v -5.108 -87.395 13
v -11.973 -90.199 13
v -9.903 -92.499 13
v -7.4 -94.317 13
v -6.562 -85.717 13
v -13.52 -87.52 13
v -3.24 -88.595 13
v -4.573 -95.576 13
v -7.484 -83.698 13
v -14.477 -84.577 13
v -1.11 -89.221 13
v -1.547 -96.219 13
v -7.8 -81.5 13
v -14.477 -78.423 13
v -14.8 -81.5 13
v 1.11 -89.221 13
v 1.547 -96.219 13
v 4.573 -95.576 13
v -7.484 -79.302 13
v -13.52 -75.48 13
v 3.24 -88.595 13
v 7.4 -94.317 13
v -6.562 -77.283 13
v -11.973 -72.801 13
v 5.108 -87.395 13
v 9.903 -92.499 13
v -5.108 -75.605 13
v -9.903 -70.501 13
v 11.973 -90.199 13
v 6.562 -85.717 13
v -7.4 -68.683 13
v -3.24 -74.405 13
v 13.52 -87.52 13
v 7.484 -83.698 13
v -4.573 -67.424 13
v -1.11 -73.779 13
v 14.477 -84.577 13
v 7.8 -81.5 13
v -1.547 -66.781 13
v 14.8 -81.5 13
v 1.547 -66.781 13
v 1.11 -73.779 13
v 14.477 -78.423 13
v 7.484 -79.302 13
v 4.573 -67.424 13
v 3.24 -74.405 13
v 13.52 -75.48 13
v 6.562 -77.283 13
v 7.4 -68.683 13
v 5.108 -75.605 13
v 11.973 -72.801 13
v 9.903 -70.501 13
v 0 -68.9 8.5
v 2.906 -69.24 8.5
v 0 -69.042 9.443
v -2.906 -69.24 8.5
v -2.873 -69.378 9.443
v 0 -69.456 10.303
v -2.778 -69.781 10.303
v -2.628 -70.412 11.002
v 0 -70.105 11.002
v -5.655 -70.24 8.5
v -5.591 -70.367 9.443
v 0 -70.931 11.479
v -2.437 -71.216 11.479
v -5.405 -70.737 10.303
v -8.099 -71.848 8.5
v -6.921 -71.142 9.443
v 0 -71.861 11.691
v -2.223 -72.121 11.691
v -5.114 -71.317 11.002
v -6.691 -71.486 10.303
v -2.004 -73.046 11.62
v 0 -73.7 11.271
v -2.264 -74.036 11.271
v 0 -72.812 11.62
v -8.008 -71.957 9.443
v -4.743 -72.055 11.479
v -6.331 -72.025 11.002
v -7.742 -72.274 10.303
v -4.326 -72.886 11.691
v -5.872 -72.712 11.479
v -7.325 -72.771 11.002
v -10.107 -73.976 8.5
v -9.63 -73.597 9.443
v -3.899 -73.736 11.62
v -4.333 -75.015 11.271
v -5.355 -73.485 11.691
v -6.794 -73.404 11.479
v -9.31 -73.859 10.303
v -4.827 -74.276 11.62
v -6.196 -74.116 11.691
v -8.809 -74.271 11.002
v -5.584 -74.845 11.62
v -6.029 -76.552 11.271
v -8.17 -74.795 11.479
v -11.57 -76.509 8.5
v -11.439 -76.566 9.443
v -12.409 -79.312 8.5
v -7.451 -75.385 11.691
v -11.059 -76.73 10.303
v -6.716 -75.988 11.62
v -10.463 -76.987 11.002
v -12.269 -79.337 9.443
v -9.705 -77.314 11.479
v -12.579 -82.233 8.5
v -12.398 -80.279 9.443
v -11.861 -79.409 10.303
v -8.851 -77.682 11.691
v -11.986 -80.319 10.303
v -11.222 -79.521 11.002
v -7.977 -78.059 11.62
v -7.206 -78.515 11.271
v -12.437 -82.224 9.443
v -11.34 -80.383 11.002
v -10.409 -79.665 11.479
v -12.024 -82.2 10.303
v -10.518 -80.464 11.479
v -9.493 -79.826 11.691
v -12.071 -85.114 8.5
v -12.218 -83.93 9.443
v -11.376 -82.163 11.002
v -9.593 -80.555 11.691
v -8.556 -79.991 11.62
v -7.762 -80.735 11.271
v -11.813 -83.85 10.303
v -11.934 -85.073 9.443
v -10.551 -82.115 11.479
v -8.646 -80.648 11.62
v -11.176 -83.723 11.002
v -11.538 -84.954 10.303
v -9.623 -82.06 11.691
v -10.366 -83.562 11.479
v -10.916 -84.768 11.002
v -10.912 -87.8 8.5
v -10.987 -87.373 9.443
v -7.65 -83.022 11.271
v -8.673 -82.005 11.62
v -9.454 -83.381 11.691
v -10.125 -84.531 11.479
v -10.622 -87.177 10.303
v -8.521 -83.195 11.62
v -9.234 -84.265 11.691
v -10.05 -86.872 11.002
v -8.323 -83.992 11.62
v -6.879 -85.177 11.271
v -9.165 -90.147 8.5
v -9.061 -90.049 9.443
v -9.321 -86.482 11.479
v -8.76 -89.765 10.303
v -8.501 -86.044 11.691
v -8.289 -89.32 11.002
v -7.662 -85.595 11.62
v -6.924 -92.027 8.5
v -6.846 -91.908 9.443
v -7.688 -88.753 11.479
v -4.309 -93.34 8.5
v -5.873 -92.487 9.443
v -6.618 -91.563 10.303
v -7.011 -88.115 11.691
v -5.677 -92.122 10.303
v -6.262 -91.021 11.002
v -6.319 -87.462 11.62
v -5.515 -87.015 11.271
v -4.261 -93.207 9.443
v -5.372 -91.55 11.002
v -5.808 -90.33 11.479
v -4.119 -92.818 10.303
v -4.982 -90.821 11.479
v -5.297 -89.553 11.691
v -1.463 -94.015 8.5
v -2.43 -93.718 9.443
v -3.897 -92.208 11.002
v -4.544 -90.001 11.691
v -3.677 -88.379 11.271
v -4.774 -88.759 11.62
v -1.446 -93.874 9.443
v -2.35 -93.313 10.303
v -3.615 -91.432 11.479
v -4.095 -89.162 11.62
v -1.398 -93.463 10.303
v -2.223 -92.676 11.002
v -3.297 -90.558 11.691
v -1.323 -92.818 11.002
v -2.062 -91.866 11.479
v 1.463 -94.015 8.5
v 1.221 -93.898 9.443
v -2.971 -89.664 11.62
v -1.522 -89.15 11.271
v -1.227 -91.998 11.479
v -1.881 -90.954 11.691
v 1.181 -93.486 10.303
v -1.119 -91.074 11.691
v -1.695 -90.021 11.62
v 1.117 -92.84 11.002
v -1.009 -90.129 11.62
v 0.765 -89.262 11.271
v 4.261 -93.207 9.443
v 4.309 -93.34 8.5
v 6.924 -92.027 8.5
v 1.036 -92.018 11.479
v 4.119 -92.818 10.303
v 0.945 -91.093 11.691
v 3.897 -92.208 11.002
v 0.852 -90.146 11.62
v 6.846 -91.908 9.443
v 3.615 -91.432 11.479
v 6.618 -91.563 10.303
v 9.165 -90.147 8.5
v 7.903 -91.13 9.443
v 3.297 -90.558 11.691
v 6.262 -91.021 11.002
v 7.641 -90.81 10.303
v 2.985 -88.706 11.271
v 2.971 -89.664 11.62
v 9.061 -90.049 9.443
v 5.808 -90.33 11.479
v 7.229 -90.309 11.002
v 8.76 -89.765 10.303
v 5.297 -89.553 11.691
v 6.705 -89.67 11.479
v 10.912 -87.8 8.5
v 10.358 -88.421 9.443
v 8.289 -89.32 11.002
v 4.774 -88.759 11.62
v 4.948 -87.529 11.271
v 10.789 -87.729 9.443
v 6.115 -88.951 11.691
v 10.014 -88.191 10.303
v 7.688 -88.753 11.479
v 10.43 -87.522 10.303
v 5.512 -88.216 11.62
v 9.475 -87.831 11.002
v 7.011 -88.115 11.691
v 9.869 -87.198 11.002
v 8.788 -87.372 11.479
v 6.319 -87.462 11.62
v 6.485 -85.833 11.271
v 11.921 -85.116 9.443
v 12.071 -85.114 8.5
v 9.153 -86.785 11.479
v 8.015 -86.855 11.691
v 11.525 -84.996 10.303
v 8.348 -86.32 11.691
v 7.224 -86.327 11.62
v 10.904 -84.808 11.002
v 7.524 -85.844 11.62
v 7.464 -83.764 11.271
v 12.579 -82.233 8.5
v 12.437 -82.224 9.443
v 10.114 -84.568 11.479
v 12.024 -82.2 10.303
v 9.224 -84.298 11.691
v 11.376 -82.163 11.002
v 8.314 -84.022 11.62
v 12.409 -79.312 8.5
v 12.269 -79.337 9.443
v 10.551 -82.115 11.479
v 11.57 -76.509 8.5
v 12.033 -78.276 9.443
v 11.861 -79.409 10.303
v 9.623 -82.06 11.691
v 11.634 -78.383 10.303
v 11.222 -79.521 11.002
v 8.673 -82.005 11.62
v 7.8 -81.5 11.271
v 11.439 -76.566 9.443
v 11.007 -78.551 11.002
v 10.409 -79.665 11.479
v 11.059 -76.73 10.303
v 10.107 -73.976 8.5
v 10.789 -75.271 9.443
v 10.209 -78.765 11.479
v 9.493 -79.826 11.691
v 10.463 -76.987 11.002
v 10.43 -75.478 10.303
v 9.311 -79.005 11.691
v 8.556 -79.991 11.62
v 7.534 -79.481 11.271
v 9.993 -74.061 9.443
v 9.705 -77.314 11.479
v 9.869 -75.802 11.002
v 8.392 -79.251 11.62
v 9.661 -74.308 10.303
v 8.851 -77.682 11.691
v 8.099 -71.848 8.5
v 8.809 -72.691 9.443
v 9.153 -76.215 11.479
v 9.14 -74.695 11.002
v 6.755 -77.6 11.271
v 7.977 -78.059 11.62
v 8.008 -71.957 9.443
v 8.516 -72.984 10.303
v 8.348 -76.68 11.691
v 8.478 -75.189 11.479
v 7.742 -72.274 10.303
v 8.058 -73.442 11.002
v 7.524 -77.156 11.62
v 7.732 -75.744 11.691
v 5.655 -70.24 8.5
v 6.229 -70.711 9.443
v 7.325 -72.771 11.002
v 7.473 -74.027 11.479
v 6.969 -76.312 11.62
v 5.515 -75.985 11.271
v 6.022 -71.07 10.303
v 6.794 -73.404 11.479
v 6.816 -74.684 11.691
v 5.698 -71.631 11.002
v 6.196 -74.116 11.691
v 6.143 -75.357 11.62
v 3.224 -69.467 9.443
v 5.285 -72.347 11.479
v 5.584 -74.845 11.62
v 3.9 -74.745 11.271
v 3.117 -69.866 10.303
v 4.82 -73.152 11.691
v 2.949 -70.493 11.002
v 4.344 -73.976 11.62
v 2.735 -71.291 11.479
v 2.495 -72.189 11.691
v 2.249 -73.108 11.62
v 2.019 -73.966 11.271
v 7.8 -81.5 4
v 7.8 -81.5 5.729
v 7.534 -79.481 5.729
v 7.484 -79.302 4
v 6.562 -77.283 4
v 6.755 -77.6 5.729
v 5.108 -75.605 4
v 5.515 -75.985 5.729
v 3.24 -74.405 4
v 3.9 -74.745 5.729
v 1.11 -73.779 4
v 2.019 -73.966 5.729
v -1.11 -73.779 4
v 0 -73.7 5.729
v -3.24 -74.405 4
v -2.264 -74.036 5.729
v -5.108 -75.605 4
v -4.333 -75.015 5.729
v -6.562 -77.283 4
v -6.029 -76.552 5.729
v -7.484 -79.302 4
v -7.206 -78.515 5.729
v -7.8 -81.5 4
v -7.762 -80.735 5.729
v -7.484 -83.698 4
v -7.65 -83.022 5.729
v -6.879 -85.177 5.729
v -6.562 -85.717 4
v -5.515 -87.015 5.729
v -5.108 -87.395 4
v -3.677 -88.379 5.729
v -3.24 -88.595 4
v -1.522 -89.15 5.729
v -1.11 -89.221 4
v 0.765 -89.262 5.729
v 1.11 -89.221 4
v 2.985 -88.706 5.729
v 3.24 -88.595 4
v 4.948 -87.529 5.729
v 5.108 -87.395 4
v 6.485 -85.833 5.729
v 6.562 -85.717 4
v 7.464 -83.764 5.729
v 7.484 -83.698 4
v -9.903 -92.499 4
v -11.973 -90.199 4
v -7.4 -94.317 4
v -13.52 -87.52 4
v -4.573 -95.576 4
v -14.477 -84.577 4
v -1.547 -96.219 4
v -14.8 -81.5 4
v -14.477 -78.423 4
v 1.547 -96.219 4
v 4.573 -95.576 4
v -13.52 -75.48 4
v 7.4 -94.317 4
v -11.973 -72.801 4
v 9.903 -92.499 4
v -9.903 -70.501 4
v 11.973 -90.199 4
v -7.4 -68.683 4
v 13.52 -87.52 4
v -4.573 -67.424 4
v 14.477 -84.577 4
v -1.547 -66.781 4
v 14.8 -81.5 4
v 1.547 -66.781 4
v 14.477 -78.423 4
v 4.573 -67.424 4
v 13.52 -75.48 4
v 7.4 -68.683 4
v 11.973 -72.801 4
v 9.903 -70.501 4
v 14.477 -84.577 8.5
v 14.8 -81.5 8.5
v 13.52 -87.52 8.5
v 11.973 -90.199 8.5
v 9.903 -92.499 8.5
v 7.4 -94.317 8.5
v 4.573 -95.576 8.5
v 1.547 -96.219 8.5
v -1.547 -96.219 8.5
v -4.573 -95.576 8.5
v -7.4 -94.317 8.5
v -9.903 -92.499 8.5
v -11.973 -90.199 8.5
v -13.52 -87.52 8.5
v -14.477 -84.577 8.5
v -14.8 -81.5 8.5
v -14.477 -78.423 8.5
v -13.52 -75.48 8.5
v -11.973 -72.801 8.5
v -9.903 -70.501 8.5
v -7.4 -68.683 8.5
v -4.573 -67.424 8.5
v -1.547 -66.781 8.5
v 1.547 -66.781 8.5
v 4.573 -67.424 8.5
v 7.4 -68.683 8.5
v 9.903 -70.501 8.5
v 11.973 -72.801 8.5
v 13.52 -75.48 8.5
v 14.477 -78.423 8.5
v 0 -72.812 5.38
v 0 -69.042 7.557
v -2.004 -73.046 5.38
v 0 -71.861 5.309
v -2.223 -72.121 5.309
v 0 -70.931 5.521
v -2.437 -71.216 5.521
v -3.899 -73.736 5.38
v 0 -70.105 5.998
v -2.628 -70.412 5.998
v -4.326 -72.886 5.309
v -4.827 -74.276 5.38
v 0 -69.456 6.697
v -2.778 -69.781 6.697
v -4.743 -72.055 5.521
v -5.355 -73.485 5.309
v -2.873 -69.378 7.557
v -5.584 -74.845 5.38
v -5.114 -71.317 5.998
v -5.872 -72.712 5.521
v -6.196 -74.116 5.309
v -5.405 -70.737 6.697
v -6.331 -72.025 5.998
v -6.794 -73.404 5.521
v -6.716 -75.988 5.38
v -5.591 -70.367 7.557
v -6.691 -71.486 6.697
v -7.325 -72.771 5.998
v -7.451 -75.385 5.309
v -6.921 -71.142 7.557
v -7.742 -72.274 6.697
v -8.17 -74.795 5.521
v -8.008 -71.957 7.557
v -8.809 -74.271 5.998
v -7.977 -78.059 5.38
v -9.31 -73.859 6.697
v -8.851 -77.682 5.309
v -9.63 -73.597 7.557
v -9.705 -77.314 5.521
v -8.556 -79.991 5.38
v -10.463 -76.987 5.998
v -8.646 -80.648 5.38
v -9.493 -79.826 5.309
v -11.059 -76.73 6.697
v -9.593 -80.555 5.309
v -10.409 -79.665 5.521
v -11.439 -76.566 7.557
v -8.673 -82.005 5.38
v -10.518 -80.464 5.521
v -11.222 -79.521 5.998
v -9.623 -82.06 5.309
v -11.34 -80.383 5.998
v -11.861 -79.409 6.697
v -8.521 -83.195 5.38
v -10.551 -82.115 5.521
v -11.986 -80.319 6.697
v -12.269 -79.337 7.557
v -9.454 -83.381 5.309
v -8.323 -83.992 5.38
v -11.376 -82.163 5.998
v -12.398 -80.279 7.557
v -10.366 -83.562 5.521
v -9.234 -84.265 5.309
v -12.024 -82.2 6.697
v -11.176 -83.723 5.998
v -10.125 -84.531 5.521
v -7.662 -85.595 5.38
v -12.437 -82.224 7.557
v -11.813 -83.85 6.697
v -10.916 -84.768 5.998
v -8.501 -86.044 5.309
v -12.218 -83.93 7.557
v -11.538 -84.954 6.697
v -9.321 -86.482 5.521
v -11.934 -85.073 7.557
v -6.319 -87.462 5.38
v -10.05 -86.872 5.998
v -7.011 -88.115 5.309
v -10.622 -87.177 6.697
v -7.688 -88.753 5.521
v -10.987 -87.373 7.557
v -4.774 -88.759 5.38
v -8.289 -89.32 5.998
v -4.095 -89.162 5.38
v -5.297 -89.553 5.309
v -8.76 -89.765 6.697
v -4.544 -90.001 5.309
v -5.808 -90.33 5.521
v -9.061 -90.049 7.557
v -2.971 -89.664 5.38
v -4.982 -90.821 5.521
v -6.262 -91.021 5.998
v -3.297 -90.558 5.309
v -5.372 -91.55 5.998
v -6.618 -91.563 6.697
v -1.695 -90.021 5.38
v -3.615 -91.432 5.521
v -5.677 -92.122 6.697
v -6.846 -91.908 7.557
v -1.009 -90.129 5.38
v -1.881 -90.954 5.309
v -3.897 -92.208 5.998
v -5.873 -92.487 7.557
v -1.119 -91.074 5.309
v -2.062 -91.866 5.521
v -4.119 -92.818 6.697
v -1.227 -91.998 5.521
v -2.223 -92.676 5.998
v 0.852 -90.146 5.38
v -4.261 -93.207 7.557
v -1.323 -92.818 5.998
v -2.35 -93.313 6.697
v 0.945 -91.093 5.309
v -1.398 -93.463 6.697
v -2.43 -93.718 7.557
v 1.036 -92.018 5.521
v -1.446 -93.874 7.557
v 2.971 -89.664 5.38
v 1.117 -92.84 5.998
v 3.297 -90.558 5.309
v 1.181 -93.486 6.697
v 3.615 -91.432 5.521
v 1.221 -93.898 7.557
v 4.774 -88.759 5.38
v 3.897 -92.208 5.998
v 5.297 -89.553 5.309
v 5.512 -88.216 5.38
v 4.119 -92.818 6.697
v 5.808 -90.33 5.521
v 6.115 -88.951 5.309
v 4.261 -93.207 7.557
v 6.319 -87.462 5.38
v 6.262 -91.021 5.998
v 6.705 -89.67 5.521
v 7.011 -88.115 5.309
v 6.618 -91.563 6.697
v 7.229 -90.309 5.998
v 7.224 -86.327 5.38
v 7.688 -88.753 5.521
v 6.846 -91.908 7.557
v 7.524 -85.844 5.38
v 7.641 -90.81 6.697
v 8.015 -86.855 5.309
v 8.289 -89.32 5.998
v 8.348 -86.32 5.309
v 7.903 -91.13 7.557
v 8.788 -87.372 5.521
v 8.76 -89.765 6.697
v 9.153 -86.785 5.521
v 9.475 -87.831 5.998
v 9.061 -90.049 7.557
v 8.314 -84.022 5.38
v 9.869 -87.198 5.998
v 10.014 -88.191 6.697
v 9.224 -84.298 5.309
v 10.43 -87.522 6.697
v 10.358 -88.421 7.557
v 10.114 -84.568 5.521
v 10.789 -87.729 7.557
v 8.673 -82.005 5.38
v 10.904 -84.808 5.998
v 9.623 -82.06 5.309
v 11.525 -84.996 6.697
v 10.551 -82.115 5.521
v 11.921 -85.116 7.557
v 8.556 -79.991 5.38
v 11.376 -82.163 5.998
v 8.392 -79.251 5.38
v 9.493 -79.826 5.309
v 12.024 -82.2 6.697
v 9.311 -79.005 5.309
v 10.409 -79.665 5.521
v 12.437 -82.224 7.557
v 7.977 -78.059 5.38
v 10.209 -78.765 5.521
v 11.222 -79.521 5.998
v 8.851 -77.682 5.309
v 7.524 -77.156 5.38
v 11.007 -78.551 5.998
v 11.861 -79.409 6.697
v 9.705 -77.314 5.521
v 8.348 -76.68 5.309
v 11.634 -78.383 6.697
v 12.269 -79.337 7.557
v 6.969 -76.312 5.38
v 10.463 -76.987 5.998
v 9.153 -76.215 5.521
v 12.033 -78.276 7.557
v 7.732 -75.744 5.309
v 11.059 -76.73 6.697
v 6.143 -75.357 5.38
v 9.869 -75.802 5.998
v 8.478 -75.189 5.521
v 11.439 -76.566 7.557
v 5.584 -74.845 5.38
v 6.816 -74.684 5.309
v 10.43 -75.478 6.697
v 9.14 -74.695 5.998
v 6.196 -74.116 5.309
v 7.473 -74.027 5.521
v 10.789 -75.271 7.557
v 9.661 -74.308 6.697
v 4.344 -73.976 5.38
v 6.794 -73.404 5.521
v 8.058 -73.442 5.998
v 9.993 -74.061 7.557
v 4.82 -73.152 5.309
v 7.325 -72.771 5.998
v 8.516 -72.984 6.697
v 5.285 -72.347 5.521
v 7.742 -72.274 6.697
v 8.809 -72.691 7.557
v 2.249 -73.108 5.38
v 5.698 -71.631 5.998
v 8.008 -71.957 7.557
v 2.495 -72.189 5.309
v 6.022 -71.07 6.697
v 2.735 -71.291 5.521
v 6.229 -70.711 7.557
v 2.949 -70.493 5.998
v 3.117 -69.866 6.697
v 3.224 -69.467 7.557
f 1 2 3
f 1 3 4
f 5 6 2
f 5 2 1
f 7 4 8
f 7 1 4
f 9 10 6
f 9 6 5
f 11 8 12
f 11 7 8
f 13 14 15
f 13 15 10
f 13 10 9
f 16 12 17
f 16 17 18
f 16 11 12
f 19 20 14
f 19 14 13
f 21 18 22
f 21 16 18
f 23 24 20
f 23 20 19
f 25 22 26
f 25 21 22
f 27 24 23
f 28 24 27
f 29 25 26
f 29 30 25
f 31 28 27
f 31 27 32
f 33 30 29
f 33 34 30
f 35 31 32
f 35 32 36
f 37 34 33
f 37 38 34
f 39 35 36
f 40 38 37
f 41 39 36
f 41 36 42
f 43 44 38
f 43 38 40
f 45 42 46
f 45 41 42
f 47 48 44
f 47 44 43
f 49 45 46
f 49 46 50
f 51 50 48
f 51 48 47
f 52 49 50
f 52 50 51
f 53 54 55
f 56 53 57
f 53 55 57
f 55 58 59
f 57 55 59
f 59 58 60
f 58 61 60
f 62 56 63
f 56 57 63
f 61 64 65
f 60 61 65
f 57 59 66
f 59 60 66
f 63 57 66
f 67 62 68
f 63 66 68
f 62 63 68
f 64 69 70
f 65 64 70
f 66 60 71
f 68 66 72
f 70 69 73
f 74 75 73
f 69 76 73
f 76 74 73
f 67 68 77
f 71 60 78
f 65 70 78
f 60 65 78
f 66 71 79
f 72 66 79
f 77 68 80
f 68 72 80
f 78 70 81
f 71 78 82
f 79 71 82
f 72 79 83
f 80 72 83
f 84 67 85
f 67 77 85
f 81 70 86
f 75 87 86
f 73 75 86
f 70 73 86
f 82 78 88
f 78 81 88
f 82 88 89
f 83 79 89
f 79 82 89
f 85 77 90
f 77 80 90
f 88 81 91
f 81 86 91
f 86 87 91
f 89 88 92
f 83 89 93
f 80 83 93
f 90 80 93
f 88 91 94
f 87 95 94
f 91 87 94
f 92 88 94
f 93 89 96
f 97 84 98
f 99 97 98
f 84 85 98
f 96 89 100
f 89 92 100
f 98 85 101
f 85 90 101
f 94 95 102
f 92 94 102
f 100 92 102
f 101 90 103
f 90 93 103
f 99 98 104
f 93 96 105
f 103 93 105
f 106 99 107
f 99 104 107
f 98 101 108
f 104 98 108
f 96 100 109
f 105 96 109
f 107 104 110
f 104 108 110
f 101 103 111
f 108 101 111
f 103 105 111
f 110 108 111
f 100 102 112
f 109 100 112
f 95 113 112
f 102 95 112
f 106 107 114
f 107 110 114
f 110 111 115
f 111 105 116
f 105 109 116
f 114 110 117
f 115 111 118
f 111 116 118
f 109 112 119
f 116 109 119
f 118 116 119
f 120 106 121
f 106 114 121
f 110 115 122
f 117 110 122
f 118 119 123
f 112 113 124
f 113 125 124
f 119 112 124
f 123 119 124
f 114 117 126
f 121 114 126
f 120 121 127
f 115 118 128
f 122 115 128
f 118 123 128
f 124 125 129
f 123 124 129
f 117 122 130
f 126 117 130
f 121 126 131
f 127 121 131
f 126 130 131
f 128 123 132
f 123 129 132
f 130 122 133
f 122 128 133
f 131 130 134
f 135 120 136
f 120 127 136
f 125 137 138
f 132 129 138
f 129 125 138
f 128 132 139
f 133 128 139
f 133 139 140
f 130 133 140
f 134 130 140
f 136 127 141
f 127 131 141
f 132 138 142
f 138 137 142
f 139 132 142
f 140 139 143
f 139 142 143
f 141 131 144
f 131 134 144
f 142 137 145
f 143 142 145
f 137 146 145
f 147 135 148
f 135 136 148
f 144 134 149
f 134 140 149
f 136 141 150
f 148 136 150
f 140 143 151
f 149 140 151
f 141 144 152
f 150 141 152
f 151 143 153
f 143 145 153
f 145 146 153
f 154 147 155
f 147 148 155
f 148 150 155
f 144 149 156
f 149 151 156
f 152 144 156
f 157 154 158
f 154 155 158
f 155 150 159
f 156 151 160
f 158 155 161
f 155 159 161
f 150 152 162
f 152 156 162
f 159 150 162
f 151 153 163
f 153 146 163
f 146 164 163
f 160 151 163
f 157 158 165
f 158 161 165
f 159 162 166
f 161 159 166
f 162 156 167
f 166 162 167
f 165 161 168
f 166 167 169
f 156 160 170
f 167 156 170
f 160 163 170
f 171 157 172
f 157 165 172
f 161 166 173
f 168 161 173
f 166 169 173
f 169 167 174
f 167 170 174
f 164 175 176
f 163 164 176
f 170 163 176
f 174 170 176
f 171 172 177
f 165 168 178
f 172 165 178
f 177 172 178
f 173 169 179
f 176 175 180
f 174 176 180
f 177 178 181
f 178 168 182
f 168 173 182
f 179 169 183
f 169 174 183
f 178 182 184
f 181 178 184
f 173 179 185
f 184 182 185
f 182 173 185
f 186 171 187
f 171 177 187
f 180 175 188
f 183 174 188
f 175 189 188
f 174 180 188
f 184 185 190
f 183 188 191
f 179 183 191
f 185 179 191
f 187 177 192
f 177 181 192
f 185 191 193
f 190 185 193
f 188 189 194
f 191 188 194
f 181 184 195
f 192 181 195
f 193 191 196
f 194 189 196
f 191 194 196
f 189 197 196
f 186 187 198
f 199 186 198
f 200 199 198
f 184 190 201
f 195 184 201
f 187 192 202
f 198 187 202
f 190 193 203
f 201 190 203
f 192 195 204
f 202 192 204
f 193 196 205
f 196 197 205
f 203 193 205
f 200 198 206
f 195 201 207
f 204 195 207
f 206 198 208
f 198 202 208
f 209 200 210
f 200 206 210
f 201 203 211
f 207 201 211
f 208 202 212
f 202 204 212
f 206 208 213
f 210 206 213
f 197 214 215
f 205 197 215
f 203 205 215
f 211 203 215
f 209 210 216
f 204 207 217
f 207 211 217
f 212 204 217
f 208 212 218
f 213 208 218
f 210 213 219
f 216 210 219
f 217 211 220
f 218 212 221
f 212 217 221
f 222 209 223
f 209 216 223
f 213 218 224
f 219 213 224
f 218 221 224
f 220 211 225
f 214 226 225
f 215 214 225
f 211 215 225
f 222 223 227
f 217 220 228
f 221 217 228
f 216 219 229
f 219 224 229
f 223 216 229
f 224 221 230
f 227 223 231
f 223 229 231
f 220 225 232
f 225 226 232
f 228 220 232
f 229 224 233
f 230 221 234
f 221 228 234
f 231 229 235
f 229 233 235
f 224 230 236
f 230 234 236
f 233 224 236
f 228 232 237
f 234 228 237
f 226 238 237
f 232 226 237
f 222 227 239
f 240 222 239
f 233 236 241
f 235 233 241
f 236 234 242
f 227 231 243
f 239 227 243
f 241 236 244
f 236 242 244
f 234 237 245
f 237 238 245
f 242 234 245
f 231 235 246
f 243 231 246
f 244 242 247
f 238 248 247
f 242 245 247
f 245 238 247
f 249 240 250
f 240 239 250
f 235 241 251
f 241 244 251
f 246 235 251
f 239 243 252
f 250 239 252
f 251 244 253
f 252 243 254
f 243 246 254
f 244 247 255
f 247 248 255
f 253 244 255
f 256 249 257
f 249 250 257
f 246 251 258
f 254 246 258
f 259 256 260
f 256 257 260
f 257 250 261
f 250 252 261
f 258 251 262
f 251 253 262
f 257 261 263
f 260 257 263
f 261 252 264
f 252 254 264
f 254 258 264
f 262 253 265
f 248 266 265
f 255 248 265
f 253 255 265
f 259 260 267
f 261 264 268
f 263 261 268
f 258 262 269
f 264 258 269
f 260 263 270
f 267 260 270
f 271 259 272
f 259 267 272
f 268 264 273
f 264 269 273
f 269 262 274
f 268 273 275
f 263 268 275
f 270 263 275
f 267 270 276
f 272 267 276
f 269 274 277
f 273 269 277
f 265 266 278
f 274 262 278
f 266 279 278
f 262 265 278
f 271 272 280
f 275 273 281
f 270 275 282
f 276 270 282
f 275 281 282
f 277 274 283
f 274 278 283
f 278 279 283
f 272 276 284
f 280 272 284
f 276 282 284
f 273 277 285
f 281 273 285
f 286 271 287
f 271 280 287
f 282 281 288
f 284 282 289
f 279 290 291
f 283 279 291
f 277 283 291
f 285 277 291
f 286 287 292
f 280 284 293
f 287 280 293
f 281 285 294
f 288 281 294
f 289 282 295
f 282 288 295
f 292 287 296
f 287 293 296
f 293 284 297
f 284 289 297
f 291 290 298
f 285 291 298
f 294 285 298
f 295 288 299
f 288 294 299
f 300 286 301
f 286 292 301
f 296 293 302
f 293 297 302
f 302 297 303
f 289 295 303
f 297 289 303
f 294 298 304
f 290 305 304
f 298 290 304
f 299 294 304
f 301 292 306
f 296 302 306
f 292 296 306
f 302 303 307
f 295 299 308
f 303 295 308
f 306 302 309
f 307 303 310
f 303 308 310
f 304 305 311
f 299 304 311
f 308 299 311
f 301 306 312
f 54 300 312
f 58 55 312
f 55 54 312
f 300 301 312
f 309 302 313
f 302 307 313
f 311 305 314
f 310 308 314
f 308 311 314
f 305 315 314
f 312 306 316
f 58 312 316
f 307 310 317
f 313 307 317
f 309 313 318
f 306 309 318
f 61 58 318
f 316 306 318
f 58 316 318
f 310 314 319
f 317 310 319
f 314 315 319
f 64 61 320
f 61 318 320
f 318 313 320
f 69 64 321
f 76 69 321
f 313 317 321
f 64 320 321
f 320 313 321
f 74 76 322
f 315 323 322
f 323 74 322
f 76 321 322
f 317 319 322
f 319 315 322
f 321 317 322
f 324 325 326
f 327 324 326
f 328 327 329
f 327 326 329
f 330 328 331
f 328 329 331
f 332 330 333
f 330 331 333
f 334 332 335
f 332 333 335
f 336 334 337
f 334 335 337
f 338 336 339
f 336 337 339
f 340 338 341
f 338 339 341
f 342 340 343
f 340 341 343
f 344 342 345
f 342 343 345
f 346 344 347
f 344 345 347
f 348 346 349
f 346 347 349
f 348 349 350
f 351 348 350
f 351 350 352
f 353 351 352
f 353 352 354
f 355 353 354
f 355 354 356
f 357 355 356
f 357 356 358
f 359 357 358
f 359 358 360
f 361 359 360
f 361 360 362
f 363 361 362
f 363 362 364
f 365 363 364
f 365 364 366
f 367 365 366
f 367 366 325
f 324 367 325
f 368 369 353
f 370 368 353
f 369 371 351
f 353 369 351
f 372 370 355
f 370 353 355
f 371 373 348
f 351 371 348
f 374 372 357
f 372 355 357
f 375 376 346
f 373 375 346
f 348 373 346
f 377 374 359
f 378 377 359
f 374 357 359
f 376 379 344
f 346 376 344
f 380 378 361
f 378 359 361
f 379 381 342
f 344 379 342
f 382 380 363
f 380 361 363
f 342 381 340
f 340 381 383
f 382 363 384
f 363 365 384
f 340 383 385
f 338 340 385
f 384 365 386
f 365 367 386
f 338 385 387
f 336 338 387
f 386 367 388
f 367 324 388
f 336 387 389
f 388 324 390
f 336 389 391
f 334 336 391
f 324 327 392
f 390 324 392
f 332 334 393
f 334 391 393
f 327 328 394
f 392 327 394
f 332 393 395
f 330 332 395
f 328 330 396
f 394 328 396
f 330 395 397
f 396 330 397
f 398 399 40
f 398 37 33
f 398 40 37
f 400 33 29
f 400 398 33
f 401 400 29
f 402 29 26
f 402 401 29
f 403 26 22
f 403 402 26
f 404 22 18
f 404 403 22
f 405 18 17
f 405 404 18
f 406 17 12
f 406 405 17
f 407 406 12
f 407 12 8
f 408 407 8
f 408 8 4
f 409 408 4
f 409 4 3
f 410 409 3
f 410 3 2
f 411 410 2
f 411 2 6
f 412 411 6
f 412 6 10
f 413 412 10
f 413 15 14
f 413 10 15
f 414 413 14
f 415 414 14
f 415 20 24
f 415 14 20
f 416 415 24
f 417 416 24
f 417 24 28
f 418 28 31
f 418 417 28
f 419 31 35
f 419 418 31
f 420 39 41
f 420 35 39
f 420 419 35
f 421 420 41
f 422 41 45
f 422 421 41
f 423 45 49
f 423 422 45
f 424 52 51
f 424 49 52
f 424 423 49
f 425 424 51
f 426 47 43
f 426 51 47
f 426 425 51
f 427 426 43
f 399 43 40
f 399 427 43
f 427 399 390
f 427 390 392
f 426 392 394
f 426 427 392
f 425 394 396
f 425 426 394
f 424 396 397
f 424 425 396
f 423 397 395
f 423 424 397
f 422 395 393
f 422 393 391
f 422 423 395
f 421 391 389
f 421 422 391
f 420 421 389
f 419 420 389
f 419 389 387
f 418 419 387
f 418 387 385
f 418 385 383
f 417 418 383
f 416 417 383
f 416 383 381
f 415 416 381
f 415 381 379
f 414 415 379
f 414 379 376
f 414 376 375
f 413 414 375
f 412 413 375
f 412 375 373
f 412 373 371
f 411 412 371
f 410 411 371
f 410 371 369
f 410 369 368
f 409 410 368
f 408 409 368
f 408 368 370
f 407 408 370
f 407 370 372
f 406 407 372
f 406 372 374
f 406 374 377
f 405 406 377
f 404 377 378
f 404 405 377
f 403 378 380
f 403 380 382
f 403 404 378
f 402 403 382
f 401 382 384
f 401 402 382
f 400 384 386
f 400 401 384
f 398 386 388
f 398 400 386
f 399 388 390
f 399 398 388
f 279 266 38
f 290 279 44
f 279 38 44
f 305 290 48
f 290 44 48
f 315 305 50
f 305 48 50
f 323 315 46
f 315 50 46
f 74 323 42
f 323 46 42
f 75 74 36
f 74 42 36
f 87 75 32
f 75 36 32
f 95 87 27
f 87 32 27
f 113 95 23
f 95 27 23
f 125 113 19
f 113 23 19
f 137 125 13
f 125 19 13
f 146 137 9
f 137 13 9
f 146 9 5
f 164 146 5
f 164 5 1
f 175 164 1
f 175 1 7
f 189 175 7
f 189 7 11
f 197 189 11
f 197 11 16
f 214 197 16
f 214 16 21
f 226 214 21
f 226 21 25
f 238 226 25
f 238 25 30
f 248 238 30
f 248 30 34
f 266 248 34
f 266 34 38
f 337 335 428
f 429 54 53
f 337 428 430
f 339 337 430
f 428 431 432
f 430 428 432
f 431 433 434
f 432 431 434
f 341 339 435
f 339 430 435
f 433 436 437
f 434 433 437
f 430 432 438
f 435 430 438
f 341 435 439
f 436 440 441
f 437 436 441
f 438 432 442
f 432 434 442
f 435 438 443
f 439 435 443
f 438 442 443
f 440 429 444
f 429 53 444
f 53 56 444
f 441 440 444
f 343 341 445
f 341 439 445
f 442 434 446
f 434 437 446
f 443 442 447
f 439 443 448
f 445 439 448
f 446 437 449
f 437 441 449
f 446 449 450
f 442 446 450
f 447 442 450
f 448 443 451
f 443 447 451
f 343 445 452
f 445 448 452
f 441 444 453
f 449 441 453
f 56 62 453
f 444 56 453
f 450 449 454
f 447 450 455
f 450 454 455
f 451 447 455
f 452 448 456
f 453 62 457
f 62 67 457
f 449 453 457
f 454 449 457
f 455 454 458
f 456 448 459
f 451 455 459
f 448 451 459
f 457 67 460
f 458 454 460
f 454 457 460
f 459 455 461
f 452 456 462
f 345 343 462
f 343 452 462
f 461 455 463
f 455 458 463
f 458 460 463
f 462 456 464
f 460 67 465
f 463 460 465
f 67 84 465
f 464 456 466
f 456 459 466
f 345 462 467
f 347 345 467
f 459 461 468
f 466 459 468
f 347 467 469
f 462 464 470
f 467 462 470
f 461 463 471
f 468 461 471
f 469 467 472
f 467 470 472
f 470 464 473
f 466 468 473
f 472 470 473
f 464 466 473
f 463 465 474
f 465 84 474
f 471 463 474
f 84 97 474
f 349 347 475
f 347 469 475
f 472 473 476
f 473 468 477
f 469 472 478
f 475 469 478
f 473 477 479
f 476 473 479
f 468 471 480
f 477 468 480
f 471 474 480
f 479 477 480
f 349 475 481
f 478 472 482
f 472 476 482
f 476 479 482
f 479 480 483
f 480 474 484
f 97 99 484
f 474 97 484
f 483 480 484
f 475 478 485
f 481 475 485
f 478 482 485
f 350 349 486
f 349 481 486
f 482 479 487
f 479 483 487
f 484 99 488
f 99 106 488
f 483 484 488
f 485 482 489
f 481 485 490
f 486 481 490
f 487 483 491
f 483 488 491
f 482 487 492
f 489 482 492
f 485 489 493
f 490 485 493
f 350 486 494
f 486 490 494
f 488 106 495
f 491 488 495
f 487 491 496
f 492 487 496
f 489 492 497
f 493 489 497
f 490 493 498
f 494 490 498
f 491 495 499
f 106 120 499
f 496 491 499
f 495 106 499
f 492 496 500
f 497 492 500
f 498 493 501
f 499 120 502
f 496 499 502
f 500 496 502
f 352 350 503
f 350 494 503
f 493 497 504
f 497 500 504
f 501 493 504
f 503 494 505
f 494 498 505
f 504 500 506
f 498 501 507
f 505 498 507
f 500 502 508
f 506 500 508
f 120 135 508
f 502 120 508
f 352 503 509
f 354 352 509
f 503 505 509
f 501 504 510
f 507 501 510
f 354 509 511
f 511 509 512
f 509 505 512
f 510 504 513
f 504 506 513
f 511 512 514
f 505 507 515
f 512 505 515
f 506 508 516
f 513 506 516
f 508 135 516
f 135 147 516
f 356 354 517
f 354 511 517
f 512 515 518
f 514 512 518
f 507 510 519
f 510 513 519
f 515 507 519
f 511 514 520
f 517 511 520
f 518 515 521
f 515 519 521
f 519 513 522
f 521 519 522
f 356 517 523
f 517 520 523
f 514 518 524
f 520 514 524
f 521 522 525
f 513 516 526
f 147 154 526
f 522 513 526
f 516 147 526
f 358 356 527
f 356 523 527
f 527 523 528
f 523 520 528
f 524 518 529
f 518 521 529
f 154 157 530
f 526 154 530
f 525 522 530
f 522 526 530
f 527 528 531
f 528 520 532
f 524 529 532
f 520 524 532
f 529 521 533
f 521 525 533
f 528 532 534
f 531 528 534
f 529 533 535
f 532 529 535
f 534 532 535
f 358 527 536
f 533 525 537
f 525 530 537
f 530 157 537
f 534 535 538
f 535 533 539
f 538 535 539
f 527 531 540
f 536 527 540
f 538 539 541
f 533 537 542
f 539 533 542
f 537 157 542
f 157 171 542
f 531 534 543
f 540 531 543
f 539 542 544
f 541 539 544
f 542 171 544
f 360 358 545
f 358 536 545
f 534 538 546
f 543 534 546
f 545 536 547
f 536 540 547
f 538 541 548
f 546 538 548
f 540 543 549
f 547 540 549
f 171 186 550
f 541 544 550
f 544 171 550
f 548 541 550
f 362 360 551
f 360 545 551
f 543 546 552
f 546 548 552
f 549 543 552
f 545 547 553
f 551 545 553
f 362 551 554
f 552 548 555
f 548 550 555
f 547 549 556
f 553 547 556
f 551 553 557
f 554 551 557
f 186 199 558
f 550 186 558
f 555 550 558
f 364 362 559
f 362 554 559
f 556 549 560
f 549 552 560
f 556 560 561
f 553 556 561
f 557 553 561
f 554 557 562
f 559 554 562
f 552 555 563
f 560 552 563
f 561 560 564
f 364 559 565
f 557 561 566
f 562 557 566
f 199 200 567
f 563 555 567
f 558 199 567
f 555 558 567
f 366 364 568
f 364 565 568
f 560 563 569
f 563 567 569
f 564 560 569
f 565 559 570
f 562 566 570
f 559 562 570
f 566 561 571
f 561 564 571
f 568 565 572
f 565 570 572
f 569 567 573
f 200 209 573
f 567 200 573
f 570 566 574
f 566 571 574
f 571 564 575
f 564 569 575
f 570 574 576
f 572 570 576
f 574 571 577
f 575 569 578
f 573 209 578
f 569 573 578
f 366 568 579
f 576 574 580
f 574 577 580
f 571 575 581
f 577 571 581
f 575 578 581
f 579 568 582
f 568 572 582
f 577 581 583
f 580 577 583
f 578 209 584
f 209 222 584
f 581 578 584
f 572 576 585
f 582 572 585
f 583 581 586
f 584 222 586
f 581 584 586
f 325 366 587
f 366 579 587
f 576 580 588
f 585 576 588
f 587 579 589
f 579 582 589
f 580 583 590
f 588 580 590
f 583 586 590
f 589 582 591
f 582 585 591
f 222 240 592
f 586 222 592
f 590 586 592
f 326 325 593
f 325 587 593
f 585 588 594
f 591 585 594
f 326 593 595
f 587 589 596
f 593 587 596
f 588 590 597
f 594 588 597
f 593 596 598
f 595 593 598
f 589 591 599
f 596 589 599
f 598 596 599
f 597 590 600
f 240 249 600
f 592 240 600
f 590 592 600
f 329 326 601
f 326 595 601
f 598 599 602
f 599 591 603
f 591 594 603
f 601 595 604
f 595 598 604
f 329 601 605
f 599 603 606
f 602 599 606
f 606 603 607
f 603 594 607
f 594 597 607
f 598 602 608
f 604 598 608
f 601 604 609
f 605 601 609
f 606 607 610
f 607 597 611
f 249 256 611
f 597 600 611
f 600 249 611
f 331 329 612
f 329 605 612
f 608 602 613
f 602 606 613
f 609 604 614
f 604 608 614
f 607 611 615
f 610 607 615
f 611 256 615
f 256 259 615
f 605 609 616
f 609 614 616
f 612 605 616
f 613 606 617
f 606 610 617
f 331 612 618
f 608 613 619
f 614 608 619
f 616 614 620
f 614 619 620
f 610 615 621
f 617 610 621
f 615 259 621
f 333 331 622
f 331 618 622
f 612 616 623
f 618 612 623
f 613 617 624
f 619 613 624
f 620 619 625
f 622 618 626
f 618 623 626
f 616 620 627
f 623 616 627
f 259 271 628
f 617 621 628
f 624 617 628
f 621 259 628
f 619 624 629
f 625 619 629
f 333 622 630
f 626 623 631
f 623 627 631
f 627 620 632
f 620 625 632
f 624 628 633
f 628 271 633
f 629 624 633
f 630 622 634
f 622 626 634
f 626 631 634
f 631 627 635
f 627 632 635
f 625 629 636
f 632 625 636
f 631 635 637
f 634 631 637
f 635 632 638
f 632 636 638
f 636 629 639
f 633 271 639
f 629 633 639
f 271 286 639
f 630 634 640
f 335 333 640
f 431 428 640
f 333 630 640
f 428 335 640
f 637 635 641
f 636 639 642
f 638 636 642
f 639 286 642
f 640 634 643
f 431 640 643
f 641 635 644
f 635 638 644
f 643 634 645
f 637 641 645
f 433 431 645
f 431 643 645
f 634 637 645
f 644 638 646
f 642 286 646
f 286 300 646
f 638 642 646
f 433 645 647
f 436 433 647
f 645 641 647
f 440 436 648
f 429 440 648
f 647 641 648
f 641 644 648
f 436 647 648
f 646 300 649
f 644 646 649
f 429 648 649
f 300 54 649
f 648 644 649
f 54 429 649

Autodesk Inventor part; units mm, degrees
ref_plane "YZ Plane" through (0, 0, 0) normal (1, 0, 0) x (0, 1, 0)
ref_plane "XZ Plane" through (0, 0, 0) normal (0, 1, 0) x (-1, 0, 0)
ref_plane "XY Plane" through (0, 0, 0) normal (0, 0, 1) x (1, 0, 0)
ref_plane "작업 평면1" through (0, -41, 8.5) normal (0, 0, 1) x (1, 0, 0)
sketch "스케치1" plane through (0, -41, 8.5) normal (0, 0, 1) x (1, 0, 0)
  circle A0 centre (0, -40.5) radius 15 projected
  circle A1 centre (0, -40.5) radius 5 projected
  circle A2 centre (0, -40.5) radius 14.8
  circle A3 centre (0, -40.5) radius 5.3
  circle A4 centre (0, -40.5) radius 13.1
  circle A5 centre (0, -40.5) radius 7
  point P0 (0, 41)
  dimension "d0" = 0.2
  dimension "d1" = 0.3
  dimension "d2" = 1.7
  dimension "d3" = 1.7
extrude "돌출1" add sketch "스케치1" along normal mid plane 9 contours A2
ref_plane "작업 평면2" through (0, -81.5, 8.5) normal (0, 0, 1) x (1, 0, 0)
sketch "스케치3" plane through (0, -81.5, 13) normal (0, 0, 1) x (1, 0, 0)
  circle A0 centre (0, 0) radius 13.1 projected
  circle A1 centre (0, 0) radius 7.8
  point P0 (0, 81.5)
  dimension "d11" = 5.3
extrude "돌출2" add sketch "스케치3" against normal up to surface (9 mm away)
sketch "스케치6" plane through (0, 0, 0) normal (1, 0, 0) x (0, 1, 0)
  line L0 (-96.3, 4) -> (-66.7, 4) projected
  line L1 (-66.7, 13) -> (-96.3, 13) projected
  line L2 (-66.7, 4) -> (-66.7, 13) projected
  line L3 (-96.3, 4) -> (-96.3, 13) projected
  circle A0 centre (-72.1, 8.5) radius 3.2
  line L4 (-81.5, -2.6) -> (-81.5, 15.6) projected
  line L5 (-68.9, 15.8649) -> (-68.9, 0.3346)
  circle A1 centre (-72.1, 8.5) radius 2.8 construction
  line L6 (-74.9, 15.3235) -> (-74.9, 0.5874) construction
  circle A2 centre (-71.7, 8.5) radius 2.8 construction
  line L7 (-74.5, 4.469) -> (-74.5, 12.0599) construction
  point P0 (0, 0)
  dimension "d19" = 6.4
  dimension "d21" = 4.5
  dimension "d22" = 29.6
  dimension "d23" = 2.2
  dimension "d25" = 5.6
  dimension "d26" = 5.6
revolve "회전2" cut sketch "스케치6" angle 360 about axis through (0, -81.5, 8.5) along (0, 0, 1) contours A0
properties part number "custom_bearing" material "고무, 검은색"
